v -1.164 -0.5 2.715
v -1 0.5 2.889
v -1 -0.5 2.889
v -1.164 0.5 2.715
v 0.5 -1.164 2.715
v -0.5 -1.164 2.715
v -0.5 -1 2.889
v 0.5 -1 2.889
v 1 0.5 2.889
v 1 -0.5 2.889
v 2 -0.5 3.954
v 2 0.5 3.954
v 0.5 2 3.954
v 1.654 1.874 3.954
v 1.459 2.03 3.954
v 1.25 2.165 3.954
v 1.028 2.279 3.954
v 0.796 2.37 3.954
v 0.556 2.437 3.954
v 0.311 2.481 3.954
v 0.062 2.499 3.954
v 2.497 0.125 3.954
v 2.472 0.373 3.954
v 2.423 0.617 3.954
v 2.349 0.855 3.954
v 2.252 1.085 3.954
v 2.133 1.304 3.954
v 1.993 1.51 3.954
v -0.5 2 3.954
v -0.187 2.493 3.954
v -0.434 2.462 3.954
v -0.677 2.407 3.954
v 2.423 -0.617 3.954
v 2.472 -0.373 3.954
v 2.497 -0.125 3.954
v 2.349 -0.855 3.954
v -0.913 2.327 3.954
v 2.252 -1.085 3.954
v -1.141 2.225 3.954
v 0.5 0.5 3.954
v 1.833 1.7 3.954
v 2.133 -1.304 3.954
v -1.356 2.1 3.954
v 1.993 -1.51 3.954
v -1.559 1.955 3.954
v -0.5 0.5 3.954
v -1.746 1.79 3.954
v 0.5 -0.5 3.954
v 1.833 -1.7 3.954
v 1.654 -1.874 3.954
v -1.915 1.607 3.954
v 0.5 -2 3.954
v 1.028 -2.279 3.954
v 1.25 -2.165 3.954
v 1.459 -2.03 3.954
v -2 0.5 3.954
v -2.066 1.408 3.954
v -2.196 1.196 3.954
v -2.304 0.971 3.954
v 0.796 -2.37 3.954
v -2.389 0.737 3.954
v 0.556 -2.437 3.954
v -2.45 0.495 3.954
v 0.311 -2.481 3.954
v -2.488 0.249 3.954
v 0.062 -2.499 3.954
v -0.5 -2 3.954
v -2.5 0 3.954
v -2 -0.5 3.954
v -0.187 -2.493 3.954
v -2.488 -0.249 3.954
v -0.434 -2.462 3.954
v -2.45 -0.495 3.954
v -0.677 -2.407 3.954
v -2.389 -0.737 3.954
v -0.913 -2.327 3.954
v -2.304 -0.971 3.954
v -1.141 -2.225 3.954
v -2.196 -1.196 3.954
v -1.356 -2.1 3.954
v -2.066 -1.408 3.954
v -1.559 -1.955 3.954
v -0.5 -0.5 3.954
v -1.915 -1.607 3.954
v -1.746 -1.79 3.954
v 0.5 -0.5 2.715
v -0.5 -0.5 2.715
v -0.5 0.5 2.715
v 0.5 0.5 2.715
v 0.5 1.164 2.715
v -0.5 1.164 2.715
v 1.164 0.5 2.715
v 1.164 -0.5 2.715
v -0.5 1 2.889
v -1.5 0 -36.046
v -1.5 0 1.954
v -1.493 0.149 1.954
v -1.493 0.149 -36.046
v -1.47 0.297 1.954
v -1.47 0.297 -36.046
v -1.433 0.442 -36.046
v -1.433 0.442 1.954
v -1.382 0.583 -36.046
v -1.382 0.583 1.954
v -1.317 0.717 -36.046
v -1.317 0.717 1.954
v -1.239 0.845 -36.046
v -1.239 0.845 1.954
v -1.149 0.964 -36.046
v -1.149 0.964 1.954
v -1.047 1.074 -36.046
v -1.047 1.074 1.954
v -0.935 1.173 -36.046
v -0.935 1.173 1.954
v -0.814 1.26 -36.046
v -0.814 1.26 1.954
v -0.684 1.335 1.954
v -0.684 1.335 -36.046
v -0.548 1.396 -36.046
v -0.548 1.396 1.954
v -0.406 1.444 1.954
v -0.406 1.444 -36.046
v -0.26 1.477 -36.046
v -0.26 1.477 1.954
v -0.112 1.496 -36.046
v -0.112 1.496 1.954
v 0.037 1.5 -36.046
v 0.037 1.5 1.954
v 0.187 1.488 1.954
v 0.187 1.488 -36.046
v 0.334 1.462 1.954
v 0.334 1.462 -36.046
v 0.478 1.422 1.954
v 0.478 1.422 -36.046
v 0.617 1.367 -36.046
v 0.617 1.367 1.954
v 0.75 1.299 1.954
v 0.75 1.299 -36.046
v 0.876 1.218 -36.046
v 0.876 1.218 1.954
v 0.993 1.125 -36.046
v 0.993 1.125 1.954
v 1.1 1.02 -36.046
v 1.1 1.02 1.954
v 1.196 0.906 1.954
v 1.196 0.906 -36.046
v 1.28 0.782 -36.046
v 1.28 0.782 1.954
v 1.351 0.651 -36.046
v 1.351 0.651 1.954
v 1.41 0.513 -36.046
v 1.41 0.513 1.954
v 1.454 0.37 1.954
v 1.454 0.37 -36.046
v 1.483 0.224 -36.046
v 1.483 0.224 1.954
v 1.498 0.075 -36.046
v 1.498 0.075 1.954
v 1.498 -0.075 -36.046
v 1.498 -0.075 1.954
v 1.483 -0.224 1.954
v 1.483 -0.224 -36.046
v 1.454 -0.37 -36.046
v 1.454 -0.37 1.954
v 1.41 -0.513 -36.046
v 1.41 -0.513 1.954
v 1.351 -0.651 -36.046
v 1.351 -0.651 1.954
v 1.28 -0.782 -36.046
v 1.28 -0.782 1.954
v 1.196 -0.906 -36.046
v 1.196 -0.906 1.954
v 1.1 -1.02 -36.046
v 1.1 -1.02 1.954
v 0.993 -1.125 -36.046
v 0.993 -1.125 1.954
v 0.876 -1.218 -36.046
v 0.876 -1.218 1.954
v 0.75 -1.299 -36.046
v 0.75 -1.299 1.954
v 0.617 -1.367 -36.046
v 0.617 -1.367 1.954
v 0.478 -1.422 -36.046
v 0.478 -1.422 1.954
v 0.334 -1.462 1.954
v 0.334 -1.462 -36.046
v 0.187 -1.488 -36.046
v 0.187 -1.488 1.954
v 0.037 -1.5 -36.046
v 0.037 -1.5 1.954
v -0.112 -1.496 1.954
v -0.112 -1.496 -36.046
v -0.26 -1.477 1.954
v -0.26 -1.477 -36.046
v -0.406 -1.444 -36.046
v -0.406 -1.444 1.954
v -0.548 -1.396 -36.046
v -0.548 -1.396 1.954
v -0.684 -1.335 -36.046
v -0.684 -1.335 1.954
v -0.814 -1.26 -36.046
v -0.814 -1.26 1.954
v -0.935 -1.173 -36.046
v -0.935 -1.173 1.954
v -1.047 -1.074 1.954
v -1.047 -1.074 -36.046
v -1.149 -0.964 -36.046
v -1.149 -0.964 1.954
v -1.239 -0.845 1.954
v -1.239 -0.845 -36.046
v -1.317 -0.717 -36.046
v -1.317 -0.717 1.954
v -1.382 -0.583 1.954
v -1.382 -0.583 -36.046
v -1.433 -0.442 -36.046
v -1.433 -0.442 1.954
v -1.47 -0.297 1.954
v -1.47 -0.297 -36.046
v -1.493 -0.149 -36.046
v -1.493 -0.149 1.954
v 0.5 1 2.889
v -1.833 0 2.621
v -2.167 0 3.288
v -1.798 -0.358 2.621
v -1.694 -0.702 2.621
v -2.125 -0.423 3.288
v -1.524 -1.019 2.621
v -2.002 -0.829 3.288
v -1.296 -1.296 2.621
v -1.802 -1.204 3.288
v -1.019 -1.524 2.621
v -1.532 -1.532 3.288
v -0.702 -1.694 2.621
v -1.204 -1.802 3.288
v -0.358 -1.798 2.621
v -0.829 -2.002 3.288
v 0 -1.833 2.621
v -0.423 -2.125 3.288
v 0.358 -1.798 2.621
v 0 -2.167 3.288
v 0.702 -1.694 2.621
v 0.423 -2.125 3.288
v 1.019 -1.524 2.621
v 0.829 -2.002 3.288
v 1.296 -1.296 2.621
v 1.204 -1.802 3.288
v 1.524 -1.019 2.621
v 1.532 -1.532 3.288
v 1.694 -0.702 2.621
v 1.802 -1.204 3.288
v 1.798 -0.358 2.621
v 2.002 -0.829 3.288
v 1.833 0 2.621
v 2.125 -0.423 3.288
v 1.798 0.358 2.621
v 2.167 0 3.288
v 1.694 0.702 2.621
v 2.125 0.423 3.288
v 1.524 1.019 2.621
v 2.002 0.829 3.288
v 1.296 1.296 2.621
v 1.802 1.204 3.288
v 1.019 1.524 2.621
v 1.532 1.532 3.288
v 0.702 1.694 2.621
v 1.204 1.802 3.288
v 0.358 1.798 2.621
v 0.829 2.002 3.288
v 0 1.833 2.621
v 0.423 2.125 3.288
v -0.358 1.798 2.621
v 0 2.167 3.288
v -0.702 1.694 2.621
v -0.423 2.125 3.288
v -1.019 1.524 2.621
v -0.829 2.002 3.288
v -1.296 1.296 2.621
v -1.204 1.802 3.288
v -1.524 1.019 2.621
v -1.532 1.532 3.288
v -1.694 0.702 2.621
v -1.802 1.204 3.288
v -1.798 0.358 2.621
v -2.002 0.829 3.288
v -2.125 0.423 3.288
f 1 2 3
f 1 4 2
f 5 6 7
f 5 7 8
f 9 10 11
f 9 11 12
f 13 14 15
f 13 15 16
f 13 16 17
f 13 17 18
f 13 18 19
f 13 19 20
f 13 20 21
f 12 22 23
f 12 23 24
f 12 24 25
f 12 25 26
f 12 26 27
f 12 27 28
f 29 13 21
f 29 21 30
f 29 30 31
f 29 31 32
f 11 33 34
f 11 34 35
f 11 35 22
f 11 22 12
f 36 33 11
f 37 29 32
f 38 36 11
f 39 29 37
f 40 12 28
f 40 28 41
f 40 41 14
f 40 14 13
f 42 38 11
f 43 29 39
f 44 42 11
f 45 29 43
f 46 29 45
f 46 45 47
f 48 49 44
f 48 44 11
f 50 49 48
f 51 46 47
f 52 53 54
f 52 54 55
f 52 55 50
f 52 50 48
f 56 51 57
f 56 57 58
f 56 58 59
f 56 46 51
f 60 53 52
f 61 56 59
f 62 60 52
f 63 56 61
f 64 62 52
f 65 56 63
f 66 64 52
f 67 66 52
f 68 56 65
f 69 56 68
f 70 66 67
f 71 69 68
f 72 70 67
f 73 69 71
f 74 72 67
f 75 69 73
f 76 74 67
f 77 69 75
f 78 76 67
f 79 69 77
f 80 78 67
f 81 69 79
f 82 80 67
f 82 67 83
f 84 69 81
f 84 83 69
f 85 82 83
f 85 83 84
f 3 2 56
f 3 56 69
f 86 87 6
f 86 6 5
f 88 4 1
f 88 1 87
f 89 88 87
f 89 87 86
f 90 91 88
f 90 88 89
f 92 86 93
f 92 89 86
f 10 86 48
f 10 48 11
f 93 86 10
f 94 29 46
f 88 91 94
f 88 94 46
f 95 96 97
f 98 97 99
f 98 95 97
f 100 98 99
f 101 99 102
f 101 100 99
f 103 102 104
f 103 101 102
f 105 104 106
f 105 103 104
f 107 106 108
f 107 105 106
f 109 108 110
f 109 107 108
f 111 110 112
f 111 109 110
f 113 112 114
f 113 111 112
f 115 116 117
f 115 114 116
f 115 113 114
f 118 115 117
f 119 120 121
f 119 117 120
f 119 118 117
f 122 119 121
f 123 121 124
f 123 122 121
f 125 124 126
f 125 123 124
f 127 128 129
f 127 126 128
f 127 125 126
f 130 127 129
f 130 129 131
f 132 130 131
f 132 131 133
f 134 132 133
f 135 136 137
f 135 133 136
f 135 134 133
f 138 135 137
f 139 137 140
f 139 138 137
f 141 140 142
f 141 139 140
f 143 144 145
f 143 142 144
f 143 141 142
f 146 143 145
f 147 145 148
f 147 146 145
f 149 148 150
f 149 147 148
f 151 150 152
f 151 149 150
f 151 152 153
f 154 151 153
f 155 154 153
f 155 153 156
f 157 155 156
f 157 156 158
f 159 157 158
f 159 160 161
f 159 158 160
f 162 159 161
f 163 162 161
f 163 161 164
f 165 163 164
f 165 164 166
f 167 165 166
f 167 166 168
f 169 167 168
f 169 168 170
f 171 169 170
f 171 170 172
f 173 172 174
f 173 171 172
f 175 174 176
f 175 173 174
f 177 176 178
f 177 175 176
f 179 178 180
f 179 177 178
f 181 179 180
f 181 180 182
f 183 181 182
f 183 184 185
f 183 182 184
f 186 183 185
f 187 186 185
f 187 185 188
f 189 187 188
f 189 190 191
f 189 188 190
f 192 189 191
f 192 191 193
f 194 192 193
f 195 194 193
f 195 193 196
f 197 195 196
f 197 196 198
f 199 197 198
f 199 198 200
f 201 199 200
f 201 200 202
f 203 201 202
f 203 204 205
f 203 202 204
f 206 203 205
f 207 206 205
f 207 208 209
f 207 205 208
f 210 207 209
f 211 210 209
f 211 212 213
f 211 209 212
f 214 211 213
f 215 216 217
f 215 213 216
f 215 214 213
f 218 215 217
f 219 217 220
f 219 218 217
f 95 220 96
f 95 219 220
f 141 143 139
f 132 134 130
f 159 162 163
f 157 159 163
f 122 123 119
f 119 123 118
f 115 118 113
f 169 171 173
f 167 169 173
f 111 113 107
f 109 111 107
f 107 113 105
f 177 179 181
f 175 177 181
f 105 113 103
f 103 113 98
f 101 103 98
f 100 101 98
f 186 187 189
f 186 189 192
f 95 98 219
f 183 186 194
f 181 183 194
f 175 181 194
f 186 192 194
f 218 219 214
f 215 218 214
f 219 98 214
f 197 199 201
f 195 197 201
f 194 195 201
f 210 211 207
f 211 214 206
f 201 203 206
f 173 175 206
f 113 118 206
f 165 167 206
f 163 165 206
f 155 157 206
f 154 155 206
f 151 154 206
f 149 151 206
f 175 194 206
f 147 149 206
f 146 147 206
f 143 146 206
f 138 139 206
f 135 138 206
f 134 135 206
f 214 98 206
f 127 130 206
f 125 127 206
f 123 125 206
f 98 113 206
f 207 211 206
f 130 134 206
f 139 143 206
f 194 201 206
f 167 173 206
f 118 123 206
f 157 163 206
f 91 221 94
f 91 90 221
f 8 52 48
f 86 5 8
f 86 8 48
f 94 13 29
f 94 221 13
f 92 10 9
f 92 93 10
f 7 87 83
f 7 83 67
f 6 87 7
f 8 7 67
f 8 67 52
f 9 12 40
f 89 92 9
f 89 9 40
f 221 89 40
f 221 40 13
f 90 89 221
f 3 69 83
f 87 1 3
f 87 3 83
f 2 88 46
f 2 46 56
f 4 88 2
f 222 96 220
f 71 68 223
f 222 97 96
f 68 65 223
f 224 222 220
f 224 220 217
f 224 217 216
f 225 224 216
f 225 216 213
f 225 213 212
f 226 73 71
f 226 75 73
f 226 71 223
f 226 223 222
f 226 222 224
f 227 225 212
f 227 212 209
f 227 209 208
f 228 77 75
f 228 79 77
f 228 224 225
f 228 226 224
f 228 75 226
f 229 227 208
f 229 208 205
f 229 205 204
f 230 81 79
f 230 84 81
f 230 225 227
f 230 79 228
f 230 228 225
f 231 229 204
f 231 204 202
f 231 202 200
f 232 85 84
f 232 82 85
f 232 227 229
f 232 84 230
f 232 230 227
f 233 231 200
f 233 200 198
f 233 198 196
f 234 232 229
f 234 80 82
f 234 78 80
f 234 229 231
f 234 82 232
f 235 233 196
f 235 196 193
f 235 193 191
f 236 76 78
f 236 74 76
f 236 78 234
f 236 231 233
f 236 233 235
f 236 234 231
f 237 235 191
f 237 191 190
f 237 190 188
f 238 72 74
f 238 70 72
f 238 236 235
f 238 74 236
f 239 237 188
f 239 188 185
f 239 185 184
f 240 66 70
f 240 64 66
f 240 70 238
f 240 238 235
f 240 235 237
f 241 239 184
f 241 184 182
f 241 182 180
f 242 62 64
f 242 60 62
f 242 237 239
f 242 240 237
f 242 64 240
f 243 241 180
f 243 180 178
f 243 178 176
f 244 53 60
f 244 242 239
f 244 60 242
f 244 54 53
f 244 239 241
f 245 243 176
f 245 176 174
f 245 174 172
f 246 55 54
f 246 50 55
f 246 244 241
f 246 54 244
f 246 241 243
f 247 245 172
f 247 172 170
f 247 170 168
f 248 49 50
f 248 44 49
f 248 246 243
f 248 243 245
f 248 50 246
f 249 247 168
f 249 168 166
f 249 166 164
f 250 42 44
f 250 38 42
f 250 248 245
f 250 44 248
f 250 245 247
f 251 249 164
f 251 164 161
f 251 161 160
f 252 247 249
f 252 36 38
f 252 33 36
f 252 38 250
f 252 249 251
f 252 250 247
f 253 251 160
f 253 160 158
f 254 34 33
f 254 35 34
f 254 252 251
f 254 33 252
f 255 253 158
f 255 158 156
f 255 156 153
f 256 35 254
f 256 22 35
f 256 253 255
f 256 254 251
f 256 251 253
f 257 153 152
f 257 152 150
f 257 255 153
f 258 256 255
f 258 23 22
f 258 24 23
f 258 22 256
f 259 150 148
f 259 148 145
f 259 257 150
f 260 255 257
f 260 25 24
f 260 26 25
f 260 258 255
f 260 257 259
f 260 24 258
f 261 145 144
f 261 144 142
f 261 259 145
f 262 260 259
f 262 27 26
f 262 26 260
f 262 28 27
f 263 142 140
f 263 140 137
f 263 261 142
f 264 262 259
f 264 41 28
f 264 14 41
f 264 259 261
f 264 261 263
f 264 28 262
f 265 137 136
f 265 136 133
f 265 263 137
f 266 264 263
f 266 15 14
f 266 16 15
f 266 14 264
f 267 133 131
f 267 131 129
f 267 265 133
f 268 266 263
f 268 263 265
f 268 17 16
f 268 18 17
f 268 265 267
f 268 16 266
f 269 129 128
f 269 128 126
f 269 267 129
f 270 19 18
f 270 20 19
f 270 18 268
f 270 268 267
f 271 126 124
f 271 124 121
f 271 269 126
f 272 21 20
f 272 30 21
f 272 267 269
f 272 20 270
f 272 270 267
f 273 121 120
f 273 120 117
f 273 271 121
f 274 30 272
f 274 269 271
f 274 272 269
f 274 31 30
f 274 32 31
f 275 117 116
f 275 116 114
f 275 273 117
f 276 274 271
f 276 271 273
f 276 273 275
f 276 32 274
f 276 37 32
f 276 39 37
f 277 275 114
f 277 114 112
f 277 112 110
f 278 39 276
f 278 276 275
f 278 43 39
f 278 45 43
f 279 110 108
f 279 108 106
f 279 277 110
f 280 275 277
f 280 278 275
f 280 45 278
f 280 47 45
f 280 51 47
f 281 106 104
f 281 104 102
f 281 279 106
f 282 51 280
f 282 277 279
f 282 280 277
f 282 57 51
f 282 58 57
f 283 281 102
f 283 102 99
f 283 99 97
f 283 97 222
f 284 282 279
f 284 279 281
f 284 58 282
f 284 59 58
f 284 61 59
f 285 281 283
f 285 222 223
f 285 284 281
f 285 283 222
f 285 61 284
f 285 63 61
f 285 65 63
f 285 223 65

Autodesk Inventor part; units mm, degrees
ref_plane "YZ Plane" through (0, 0, 0) normal (1, 0, 0) x (0, 1, 0)
ref_plane "XZ Plane" through (0, 0, 0) normal (0, 1, 0) x (-1, 0, 0)
ref_plane "XY Plane" through (0, 0, 0) normal (0, 0, 1) x (1, 0, 0)
sketch "Sketch1" plane through (0, 0, 0) normal (0, 1, 0) x (-1, 0, 0)
  line L0 (0, 3.9544) -> (2.5, 3.9544)
  line L1 (2.5, 3.9544) -> (1.5, 1.9544)
  line L2 (1.5, 1.9544) -> (1.5, -36.0456)
  line L3 (1.5, -36.0456) -> (0, -36.0456)
  line L4 (0, -36.0456) -> (0, 3.9544)
  point P0 (0, 0)
  dimension "d0" = 2.5
  dimension "d1" = 2
  dimension "d2" = 40
  dimension "d21" = 1.5
revolve "Revolution1" add sketch "Sketch1" angle 360 about axis through (0, 0, -36.0456) along (0, 0, 1)
sketch "Sketch2" plane through (0, 0, 3.9544) normal (0, 0, 1) x (1, 0, 0)
  line L0 (-0.5, 0) -> (0.5, 0)
  line L1 (0.5, 0) -> (0.5, 2)
  line L2 (0.5, 2) -> (-0.5, 2)
  line L3 (-0.5, 2) -> (-0.5, 0)
  point P0 (0, 0)
  dimension "d4" = 1
  dimension "d5" = 2
  dimension "d6" = 0.5
ref_plane "Work Plane2" through (-0.5, 2, 3.9544) normal (-1, 0, 0) x (0, -1, 0)
sketch "Sketch4" plane through (-0.5, 2, 3.9544) normal (-1, 0, 0) x (0, -1, 0)
  line L0 (-0.5, 0) -> (4.5, 0) projected
  line L1 (-0.4472, 0) -> (0.7164, -1.2393)
  point P0 (2, -3.9544)
  dimension "d15" = 1.7
sweep "Sweep1" cut profiles "Sketch2" path "Sketch4" path curves L1
pattern_circular "Circular Pattern1" count 4 over 360 about axis through (0, 0, 2.9544) along (0, 0, -1) of "Sweep1"
thread "Thread2"
equation "\"d6\" = 0.5 * d4"
properties part number "Fi3es60mmcsavar" material "Steel, Alloy"
